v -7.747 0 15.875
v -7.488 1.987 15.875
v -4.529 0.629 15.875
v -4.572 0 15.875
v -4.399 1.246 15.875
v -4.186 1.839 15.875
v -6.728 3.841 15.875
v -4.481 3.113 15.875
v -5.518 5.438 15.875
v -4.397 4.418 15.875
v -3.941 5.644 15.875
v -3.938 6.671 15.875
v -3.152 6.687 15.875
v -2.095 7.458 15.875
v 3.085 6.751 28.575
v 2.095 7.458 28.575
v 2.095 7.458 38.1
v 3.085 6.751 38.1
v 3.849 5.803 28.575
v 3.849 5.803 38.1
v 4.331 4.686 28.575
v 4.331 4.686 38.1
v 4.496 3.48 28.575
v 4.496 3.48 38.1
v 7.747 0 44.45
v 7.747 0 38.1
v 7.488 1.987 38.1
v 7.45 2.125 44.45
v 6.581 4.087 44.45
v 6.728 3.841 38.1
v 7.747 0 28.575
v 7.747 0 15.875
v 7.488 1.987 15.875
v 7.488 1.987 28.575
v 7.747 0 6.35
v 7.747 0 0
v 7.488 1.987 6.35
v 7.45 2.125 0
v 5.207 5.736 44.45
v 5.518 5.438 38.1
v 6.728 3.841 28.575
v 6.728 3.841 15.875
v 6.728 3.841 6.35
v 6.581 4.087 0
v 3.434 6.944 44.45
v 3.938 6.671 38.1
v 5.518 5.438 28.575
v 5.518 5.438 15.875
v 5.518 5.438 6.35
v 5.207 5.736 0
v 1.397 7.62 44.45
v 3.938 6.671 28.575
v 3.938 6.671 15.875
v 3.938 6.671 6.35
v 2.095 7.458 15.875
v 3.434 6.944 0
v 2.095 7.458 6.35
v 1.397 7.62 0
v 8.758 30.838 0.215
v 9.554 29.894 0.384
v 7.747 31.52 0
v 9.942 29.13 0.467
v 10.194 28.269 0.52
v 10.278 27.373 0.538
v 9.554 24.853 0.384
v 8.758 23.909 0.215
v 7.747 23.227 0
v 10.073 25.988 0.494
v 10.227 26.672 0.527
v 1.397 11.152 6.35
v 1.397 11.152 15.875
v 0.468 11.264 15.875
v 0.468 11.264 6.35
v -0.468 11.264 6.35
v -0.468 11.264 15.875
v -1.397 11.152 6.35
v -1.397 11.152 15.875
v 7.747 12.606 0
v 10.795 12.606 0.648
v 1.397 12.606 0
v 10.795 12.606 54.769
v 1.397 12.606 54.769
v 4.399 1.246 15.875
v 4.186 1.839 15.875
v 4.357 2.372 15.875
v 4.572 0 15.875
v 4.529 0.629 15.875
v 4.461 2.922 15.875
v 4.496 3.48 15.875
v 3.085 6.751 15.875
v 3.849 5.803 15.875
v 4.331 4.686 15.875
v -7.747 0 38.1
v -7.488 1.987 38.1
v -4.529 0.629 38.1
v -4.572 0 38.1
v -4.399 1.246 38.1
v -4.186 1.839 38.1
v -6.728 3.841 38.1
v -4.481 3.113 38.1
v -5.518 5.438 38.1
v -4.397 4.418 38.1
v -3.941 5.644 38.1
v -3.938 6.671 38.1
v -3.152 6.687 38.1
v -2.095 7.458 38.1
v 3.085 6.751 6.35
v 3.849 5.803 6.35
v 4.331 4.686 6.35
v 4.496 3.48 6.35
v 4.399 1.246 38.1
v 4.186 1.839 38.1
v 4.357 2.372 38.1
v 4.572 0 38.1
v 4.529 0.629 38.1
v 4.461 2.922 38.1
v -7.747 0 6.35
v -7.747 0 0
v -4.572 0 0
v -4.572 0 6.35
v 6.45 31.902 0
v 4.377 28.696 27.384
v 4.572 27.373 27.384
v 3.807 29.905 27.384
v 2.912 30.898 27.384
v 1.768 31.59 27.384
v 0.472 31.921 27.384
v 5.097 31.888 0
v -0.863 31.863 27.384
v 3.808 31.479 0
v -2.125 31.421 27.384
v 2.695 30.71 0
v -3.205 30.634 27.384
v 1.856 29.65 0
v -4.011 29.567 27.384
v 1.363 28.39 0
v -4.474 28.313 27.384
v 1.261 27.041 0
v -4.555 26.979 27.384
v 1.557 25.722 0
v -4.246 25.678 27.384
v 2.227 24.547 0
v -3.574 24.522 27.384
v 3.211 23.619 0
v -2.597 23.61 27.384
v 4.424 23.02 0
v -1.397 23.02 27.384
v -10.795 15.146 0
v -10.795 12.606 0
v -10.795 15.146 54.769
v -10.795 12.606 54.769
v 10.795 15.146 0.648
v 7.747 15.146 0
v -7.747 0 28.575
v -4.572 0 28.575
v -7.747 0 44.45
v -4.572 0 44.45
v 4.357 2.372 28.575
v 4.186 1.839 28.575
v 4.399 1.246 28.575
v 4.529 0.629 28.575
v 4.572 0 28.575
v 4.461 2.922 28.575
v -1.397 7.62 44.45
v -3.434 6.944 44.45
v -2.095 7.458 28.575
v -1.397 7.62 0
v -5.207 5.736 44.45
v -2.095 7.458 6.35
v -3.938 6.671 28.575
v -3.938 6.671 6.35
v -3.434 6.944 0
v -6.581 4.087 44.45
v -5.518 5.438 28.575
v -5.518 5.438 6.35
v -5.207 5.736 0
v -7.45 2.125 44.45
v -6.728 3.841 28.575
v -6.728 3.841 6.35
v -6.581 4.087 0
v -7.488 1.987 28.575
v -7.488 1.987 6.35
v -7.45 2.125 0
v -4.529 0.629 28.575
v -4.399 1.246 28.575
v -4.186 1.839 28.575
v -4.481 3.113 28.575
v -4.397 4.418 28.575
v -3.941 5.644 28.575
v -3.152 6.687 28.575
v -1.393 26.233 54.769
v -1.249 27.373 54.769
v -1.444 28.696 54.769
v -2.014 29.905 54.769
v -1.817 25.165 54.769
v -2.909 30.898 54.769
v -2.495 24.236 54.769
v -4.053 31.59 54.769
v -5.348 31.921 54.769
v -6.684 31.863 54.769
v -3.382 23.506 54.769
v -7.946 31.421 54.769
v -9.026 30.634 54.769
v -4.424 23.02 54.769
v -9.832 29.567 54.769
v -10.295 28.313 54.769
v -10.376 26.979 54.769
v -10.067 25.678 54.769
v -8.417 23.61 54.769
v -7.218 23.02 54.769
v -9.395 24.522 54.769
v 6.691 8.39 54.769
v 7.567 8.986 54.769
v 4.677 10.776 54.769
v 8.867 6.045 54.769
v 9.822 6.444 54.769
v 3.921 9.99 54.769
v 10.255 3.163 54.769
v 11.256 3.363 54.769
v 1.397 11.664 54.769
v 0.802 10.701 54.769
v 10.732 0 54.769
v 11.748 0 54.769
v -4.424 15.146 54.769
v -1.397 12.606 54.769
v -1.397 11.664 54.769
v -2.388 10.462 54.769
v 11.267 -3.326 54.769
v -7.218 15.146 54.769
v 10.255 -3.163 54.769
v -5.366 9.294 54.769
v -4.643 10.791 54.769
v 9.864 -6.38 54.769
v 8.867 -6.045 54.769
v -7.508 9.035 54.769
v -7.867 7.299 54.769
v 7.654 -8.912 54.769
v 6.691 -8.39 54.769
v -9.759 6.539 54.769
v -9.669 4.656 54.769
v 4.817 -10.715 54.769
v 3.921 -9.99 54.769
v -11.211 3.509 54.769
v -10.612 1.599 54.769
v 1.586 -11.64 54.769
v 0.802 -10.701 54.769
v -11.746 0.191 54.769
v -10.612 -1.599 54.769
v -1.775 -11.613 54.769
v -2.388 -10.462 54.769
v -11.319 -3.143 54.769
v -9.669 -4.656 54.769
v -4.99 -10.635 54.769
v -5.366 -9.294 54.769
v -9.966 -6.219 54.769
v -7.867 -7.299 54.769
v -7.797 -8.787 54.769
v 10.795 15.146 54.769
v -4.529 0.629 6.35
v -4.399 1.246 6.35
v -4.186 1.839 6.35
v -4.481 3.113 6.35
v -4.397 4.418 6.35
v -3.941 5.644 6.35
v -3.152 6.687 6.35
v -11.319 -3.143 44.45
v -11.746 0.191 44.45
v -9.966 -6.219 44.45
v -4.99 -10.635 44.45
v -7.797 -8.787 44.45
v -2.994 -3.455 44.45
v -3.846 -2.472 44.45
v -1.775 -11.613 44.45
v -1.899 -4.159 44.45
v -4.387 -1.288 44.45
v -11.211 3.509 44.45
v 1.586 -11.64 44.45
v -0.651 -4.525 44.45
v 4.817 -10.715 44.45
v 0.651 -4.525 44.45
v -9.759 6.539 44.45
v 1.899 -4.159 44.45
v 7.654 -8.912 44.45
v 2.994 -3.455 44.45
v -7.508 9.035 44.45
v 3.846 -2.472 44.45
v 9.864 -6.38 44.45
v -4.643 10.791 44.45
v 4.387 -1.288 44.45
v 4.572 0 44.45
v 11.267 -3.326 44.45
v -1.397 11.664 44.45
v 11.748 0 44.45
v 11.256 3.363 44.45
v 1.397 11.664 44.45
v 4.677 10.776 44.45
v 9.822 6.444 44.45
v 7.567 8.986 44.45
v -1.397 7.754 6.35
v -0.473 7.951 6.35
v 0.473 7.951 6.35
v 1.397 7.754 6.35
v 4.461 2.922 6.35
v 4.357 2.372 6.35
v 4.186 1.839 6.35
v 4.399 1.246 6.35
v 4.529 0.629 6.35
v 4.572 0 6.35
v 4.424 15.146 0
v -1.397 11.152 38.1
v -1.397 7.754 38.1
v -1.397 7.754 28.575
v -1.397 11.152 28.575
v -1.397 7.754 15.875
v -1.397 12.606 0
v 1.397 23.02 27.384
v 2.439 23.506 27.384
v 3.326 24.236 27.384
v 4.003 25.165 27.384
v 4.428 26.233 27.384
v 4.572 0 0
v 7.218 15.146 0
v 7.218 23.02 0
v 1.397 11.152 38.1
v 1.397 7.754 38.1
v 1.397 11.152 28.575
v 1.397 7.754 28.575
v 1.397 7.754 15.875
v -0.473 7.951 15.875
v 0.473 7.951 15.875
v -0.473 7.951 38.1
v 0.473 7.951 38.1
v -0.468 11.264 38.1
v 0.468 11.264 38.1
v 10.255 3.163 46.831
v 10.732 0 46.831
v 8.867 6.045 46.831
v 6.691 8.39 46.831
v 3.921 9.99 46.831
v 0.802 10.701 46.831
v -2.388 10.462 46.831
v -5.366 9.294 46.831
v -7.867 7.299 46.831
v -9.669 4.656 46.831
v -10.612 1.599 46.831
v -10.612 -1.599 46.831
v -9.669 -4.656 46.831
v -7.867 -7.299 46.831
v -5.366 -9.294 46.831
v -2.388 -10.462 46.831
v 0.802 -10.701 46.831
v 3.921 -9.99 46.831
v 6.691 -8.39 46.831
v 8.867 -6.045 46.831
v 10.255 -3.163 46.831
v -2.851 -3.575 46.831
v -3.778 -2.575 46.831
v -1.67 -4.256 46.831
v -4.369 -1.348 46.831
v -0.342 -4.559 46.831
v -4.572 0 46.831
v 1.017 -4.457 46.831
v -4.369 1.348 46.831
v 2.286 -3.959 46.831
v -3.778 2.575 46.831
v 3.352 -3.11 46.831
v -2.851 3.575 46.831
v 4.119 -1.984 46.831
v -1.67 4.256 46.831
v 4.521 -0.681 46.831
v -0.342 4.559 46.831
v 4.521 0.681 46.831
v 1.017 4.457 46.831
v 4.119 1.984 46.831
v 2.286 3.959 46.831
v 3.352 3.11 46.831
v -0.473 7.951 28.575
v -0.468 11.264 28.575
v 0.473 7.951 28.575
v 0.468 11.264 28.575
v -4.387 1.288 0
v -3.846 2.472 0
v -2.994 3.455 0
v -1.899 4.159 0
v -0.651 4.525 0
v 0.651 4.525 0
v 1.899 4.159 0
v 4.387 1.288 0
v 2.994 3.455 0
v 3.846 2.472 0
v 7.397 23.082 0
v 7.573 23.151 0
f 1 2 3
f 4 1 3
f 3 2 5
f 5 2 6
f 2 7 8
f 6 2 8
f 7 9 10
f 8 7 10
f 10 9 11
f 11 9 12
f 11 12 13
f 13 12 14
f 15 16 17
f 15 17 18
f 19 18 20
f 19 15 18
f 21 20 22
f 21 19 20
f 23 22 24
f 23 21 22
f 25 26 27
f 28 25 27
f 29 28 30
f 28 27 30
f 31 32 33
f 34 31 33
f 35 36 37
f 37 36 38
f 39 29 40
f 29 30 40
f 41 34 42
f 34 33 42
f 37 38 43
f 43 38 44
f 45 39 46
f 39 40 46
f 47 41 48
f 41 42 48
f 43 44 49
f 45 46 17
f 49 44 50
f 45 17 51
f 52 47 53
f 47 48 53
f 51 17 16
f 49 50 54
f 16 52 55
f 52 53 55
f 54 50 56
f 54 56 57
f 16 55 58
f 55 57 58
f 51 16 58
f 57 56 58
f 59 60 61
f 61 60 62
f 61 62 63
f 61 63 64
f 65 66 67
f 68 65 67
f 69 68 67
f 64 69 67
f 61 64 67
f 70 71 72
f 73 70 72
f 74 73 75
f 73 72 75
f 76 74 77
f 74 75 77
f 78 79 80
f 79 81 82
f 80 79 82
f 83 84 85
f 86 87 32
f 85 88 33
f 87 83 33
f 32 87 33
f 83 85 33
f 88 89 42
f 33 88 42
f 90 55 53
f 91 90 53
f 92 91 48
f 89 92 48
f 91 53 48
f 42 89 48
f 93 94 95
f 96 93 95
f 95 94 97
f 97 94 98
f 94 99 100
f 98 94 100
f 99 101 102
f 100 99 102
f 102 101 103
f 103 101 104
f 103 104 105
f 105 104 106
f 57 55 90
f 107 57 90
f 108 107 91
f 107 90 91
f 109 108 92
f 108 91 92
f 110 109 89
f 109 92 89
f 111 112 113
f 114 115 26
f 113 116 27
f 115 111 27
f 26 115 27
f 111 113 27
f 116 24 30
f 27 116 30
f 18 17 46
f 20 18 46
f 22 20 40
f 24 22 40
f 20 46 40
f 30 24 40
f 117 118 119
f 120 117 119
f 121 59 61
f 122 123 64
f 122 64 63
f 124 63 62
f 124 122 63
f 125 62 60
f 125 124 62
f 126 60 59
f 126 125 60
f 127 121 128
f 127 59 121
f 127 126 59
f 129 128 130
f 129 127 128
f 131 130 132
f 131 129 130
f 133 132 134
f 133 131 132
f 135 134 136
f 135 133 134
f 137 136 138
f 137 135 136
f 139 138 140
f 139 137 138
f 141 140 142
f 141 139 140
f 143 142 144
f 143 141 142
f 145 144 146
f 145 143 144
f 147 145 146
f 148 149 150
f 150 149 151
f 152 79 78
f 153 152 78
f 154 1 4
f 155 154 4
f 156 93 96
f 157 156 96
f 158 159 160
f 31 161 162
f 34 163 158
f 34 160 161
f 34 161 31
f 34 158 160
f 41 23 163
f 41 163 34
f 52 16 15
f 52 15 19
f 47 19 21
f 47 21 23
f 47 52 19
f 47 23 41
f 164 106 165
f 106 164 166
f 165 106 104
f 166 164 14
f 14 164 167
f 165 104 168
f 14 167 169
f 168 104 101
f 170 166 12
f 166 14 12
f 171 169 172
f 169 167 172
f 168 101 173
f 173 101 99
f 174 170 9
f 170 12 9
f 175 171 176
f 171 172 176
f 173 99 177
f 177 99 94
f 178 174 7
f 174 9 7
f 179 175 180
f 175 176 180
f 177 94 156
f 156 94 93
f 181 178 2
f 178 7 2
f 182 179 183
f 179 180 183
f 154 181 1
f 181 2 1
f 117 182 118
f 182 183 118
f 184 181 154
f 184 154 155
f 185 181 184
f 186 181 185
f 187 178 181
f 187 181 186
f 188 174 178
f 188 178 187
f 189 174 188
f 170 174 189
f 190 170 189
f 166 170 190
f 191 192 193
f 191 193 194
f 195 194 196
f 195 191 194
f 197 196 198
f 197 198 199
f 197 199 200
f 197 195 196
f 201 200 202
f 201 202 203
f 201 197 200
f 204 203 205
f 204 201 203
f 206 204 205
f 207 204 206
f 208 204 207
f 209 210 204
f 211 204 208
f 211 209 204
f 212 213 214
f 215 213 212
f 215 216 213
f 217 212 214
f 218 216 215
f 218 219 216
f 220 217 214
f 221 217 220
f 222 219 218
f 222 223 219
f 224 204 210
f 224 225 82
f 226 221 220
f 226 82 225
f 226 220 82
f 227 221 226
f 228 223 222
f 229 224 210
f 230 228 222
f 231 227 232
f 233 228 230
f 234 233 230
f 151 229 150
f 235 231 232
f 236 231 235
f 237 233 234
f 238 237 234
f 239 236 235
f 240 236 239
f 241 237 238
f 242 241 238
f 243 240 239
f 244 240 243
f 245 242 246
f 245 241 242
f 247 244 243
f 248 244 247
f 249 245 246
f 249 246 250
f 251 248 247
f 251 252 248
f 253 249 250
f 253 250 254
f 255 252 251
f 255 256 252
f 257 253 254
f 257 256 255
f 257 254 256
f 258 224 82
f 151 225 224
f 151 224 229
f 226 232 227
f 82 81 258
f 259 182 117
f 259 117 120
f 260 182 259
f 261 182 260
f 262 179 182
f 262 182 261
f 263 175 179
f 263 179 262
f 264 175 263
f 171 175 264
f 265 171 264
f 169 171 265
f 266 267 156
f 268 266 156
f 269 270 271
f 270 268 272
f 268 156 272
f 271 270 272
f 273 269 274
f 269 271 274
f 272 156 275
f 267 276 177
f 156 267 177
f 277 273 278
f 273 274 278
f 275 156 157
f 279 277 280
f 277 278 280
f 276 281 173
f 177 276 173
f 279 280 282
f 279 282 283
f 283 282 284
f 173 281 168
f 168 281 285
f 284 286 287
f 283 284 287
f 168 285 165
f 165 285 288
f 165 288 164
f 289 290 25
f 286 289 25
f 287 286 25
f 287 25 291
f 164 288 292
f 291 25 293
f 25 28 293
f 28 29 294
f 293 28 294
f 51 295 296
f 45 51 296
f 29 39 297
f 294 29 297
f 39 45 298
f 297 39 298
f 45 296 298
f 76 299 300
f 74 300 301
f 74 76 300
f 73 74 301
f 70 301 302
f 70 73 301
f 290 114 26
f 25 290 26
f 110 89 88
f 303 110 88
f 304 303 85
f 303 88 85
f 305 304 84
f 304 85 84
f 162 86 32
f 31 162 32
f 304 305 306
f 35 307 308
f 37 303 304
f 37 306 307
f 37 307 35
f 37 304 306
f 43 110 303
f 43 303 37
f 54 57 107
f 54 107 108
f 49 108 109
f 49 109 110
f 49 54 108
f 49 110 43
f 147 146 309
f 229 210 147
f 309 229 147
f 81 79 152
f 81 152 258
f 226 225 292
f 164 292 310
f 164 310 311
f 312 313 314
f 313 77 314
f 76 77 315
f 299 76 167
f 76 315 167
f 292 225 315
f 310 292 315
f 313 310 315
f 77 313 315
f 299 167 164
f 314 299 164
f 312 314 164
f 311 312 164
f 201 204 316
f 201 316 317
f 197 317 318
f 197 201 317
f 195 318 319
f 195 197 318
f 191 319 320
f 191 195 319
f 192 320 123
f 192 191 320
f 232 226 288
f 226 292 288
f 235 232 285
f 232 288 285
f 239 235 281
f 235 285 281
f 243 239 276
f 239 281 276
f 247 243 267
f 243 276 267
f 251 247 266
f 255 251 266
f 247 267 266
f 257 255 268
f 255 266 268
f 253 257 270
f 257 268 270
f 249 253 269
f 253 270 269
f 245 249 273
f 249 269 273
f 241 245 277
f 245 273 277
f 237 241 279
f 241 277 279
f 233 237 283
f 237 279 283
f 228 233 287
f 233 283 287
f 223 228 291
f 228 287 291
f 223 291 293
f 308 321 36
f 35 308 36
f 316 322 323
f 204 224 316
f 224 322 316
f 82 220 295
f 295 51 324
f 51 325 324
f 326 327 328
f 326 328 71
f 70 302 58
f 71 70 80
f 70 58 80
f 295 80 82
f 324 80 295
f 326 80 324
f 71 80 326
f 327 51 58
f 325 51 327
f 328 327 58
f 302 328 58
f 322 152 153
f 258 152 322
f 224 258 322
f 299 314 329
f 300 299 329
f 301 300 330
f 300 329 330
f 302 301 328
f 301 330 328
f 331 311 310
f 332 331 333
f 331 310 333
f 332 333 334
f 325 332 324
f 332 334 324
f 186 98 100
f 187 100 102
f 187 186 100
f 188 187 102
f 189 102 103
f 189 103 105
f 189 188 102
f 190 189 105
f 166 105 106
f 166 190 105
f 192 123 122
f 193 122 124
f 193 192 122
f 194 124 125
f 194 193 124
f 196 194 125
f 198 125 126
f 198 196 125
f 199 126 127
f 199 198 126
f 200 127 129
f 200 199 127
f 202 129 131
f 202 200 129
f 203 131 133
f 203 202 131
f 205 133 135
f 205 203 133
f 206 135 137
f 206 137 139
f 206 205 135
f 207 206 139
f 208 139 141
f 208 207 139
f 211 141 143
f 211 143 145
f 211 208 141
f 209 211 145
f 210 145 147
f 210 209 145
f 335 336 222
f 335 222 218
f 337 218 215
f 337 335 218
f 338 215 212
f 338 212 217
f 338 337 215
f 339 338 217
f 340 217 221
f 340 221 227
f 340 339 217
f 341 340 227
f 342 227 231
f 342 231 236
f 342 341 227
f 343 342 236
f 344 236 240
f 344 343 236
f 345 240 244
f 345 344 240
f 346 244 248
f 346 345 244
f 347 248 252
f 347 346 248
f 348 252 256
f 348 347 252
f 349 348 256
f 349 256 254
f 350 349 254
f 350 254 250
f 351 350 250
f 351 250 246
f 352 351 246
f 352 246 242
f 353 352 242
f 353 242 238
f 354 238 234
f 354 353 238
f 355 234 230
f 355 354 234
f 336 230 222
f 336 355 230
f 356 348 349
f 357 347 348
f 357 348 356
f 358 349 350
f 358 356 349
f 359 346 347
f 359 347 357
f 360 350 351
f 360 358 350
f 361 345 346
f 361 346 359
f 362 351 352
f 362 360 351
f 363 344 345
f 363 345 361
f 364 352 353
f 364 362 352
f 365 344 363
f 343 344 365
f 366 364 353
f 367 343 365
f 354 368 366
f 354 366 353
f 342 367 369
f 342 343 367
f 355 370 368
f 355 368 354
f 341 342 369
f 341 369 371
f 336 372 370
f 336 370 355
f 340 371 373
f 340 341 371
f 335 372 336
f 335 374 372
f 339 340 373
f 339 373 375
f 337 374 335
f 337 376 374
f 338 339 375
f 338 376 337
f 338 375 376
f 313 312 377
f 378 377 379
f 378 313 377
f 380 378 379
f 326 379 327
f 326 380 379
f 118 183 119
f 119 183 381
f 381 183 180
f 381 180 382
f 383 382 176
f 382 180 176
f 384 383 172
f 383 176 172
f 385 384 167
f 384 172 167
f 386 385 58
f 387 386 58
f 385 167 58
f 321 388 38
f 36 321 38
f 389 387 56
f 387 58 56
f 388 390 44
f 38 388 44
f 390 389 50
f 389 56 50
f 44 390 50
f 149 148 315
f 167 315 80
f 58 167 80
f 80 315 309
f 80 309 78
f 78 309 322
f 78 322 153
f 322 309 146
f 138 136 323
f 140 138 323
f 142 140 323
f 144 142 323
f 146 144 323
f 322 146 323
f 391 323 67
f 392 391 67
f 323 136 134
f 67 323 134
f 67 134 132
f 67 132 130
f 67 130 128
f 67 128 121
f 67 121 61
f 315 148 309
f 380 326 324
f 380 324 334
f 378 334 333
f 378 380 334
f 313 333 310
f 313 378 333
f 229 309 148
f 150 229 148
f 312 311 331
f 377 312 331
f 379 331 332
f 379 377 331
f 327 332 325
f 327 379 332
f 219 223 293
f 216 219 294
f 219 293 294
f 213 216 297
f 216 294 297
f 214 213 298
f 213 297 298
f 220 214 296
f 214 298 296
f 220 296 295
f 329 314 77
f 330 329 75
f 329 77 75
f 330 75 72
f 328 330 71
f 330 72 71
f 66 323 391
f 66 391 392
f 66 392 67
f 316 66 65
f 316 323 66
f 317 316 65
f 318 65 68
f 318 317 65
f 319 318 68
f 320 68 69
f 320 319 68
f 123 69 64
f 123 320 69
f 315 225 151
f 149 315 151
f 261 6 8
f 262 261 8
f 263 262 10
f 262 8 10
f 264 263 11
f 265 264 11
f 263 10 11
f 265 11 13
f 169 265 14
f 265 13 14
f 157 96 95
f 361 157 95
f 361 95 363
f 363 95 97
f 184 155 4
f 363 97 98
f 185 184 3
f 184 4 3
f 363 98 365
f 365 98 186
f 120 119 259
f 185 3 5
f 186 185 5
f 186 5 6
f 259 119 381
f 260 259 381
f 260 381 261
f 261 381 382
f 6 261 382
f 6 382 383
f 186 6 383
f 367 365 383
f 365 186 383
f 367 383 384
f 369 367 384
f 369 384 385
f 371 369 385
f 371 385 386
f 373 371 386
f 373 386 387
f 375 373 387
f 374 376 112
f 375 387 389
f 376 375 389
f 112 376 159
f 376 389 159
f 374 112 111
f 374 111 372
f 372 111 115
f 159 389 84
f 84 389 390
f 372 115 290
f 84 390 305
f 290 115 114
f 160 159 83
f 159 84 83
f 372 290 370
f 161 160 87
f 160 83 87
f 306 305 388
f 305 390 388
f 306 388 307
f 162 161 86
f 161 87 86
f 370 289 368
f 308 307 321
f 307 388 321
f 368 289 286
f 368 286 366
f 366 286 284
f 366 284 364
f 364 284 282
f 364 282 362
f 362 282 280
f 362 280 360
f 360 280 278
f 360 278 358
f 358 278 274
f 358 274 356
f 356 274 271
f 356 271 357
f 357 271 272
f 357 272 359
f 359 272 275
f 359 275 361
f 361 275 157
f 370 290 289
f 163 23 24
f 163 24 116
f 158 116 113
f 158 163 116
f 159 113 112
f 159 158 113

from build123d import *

# Parameters (mm, degrees)
F1_DEPTH  = 44.45
F9_DEPTH  = 9.525
F10_DEPTH = 9.525
F12_DEPTH = 2.38125
F13_R     = 11.7475
F13_R_2   = 10.7315
F14_DEPTH = 7.9375
F15_DEPTH = 10.31875
F16_W     = 26.9525004551
F16_H     = 57.8892836347
F17_DEPTH = 12.7
F19_W     = 21.59
F19_H     = 54.76875
F20_DEPTH = 2.54
F27_DEPTH = 25.4


with BuildPart() as f1:
    # F0 (on Top) → F1 (new body)
    with BuildSketch(Plane.XY):
        with BuildLine():
            ThreePointArc((-4.572, 0), (0, 4.572), (4.572, 0))
            Line((4.572, 0), (7.747, 0))
            ThreePointArc((7.747, 0), (5.951410253, 4.9595085442), (1.397, 7.62))
            ThreePointArc((1.397, 7.62), (0, 7.747), (-1.397, 7.62))
            ThreePointArc((-1.397, 7.62), (-5.951410253, 4.9595085442), (-7.747, 0))
            Line((-7.747, 0), (-4.572, 0))
        make_face()
        with BuildLine():
            ThreePointArc((-1.397, 7.62), (0, 7.747), (1.397, 7.62))
            Line((1.397, 7.62), (1.397, 19.3802))
            ThreePointArc((1.397, 19.3802), (0, 19.1615406713), (-1.397, 19.3802))
            Line((-1.397, 19.3802), (-1.397, 7.62))
        make_face()
        with BuildLine():
            ThreePointArc((-1.397, 19.3802), (0, 19.1615406713), (1.397, 19.3802))
            ThreePointArc((1.397, 19.3802), (3.6939320514, 21.0394638349), (4.572, 23.7335406713))
            ThreePointArc((4.572, 23.7335406713), (-2.6940768363, 27.4274727226), (-1.397, 19.3802))
        make_face()
    extrude(amount=F1_DEPTH)

    # F6 (on offset) → F9 (cut)
    with BuildSketch(Plane.XY.offset(28.575)):
        with BuildLine():
            ThreePointArc((4.1557772601, 1.7640375299), (0, -1.016), (-4.1557772601, 1.7640375299))
            Line((-4.1557772601, 1.7640375299), (-7.6070004234, 1.7640375299))
            ThreePointArc((-7.6070004234, 1.7640375299), (0, -4.318), (7.6070004234, 1.7640375299))
            Line((7.6070004234, 1.7640375299), (4.1557772601, 1.7640375299))
        make_face()
        with BuildLine():
            ThreePointArc((-4.1557772601, 1.7640375299), (-0.8747878771, 7.8904367738), (4.4961791045, 3.4801791045))
            ThreePointArc((4.4961791045, 3.4801791045), (4.4102576693, 2.6053912274), (4.1557772601, 1.7640375299))
            Line((4.1557772601, 1.7640375299), (7.6070004234, 1.7640375299))
            ThreePointArc((7.6070004234, 1.7640375299), (7.750237064, 2.6168003938), (7.7981791045, 3.4801791045))
            ThreePointArc((7.7981791045, 3.4801791045), (-0.8633787106, 11.2304161684), (-7.6070004234, 1.7640375299))
            Line((-7.6070004234, 1.7640375299), (-4.1557772601, 1.7640375299))
        make_face()
        with BuildLine():
            ThreePointArc((7.6070004234, 1.7640375299), (0, -4.318), (-7.6070004234, 1.7640375299))
            Line((-7.6070004234, 1.7640375299), (-8.4216929972, 1.7640375299))
            Line((-8.4216929972, 1.7640375299), (-8.4216929972, -6.3198274001))
            Line((-8.4216929972, -6.3198274001), (11.7628639564, -6.3198274001))
            Line((11.7628639564, -6.3198274001), (11.7628639564, 1.7640375299))
            Line((11.7628639564, 1.7640375299), (7.6070004234, 1.7640375299))
        make_face()
    extrude(amount=F9_DEPTH, mode=Mode.SUBTRACT)

    # F8 (on offset) → F10 (cut)
    with BuildSketch(Plane.XY.offset(15.875)):
        with BuildLine():
            ThreePointArc((4.179462045, 1.8225532258), (0, -1.016), (-4.179462045, 1.8225532258))
            Line((-4.179462045, 1.8225532258), (-7.6199654718, 1.8225532258))
            ThreePointArc((-7.6199654718, 1.8225532258), (0, -4.318), (7.6199654718, 1.8225532258))
            Line((7.6199654718, 1.8225532258), (4.179462045, 1.8225532258))
        make_face()
        with BuildLine():
            ThreePointArc((-4.179462045, 1.8225532258), (-0.8438058499, 7.8964692022), (4.4961791045, 3.4801791045))
            ThreePointArc((4.4961791045, 3.4801791045), (4.4162900977, 2.6363732546), (4.179462045, 1.8225532258))
            Line((4.179462045, 1.8225532258), (7.6199654718, 1.8225532258))
            ThreePointArc((7.6199654718, 1.8225532258), (7.7534976902, 2.6465899292), (7.7981791045, 3.4801791045))
            ThreePointArc((7.7981791045, 3.4801791045), (-0.8335891753, 11.2336767947), (-7.6199654718, 1.8225532258))
            Line((-7.6199654718, 1.8225532258), (-4.179462045, 1.8225532258))
        make_face()
        with BuildLine():
            ThreePointArc((7.6199654718, 1.8225532258), (0, -4.318), (-7.6199654718, 1.8225532258))
            Line((-7.6199654718, 1.8225532258), (-8.5849482566, 1.8225532258))
            Line((-8.5849482566, 1.8225532258), (-8.5849482566, -5.9901881032))
            Line((-8.5849482566, -5.9901881032), (8.4006469697, -5.9901881032))
            Line((8.4006469697, -5.9901881032), (8.4006469697, 1.8225532258))
            Line((8.4006469697, 1.8225532258), (7.6199654718, 1.8225532258))
        make_face()
    extrude(amount=-F10_DEPTH, mode=Mode.SUBTRACT)

    # F11 (on face) → F12 (join)
    with BuildSketch(Plane.XY.offset(44.45)):
        with BuildLine():
            ThreePointArc((-1.397, 11.6641393703), (-7.7971949684, -8.7867802337), (11.7475, 0))
            ThreePointArc((11.7475, 0), (8.7867802337, 7.7971949684), (1.397, 11.6641393703))
            Line((1.397, 11.6641393703), (1.397, 7.62))
            ThreePointArc((1.397, 7.62), (5.951410253, 4.9595085442), (7.747, 0))
            Line((7.747, 0), (4.572, 0))
            ThreePointArc((4.572, 0), (0, -4.572), (-4.572, 0))
            Line((-4.572, 0), (-7.747, 0))
            ThreePointArc((-7.747, 0), (-5.951410253, 4.9595085442), (-1.397, 7.62))
            Line((-1.397, 7.62), (-1.397, 11.6641393703))
        make_face()
        with BuildLine():
            Line((1.397, 7.62), (1.397, 11.6641393703))
            ThreePointArc((1.397, 11.6641393703), (0, 11.7475), (-1.397, 11.6641393703))
            Line((-1.397, 11.6641393703), (-1.397, 7.62))
            ThreePointArc((-1.397, 7.62), (-5.951410253, 4.9595085442), (-7.747, 0))
            Line((-7.747, 0), (-4.572, 0))
            ThreePointArc((-4.572, 0), (0, 4.572), (4.572, 0))
            Line((4.572, 0), (7.747, 0))
            ThreePointArc((7.747, 0), (5.951410253, 4.9595085442), (1.397, 7.62))
        make_face()
    extrude(amount=F12_DEPTH)

    # F13 (on face) → F14 (join)
    with BuildSketch(Plane.XY.offset(46.83125)):
        Circle(F13_R)
        Circle(F13_R_2, mode=Mode.SUBTRACT)
    extrude(amount=F14_DEPTH)

    # F15 (add, through all): a face of the model
    f15_faces = [f1.faces().sort_by_distance(p)[0] for p in [
        (0, 21.7334038121, 44.45),
    ]]
    extrude(f15_faces, amount=F15_DEPTH)

    # F16 (on Right) → F17 (cut, symmetric)
    with BuildSketch(Plane.YZ):
        with Locations((26.0822460987, 27.6629510336)):
            Rectangle(F16_W, F16_H)
    extrude(amount=F17_DEPTH, both=True, mode=Mode.SUBTRACT)



with BuildPart() as f20:
    # F19 (on offset) → F20 (new body)
    with BuildSketch(Plane(origin=(0, 12.6059958711, 0), x_dir=(-1, 0, 0), z_dir=(0, 1, 0))):
        with Locations((0, 27.384375)):
            Rectangle(F19_W, F19_H)
    extrude(amount=F20_DEPTH)

    # F24: sweep along a path in F23
    with BuildLine(Plane(origin=(0, 15.1459958711, 0), x_dir=(-1, 0, 0), z_dir=(0, 1, 0))) as f24_path:
        Line((0, 27.384375), (5.8207285935, 54.76875))
    # F22 (on mid) → F24 (sweep)
    with BuildSketch(Plane.XY.offset(27.384375)):
        with BuildLine():
            ThreePointArc((4.572, 27.3733365424), (-2.6940768363, 31.0672685937), (-1.397, 23.0199958711))
            ThreePointArc((-1.397, 23.0199958711), (0, 22.8013365424), (1.397, 23.0199958711))
            ThreePointArc((1.397, 23.0199958711), (3.6939320514, 24.6792597061), (4.572, 27.3733365424))
        make_face()
        with BuildLine():
            Line((-1.397, 23.0199958711), (-1.397, 15.1459958711))
            Line((-1.397, 15.1459958711), (1.397, 15.1459958711))
            Line((1.397, 15.1459958711), (1.397, 23.0199958711))
            ThreePointArc((1.397, 23.0199958711), (0, 22.8013365424), (-1.397, 23.0199958711))
        make_face()
    sweep(path=f24_path.line)


with BuildPart() as f1_1:
    add(f1.part)

    add(f20.part)  # F25 merges F20
    # F25: sweep along a path in F23
    with BuildLine(Plane(origin=(0, 15.1459958711, 0), x_dir=(-1, 0, 0), z_dir=(0, 1, 0))) as f25_path:
        Line((-5.8207285935, 0), (0, 27.384375))
    # F22 (on mid) → F25 (sweep)
    with BuildSketch(Plane.XY.offset(27.384375)):
        with BuildLine():
            Line((-1.397, 23.0199958711), (-1.397, 15.1459958711))
            Line((-1.397, 15.1459958711), (1.397, 15.1459958711))
            Line((1.397, 15.1459958711), (1.397, 23.0199958711))
            ThreePointArc((1.397, 23.0199958711), (0, 22.8013365424), (-1.397, 23.0199958711))
        make_face()
        with BuildLine():
            ThreePointArc((4.572, 27.3733365424), (-2.6940768363, 31.0672685937), (-1.397, 23.0199958711))
            ThreePointArc((-1.397, 23.0199958711), (0, 22.8013365424), (1.397, 23.0199958711))
            ThreePointArc((1.397, 23.0199958711), (3.6939320514, 24.6792597061), (4.572, 27.3733365424))
        make_face()
    sweep(path=f25_path.line)

    # F26 (on face) → F27 (cut)
    with BuildSketch(Plane.XZ.offset(-12.6059958711)):
        Polygon((7.747, 0), (3.5317886158, -0.8959708385), (7.8619366049, -6.503867323), (24.6146406516, -1.8187895067), (20.6104957086, 2.7342204189), (10.795, 0.6478724), (10.795, 0), align=None)
        Polygon((10.795, 0.6478724), (7.747, 0), (10.795, 0), align=None)
    extrude(amount=-F27_DEPTH, mode=Mode.SUBTRACT)


solid = f1_1.part
